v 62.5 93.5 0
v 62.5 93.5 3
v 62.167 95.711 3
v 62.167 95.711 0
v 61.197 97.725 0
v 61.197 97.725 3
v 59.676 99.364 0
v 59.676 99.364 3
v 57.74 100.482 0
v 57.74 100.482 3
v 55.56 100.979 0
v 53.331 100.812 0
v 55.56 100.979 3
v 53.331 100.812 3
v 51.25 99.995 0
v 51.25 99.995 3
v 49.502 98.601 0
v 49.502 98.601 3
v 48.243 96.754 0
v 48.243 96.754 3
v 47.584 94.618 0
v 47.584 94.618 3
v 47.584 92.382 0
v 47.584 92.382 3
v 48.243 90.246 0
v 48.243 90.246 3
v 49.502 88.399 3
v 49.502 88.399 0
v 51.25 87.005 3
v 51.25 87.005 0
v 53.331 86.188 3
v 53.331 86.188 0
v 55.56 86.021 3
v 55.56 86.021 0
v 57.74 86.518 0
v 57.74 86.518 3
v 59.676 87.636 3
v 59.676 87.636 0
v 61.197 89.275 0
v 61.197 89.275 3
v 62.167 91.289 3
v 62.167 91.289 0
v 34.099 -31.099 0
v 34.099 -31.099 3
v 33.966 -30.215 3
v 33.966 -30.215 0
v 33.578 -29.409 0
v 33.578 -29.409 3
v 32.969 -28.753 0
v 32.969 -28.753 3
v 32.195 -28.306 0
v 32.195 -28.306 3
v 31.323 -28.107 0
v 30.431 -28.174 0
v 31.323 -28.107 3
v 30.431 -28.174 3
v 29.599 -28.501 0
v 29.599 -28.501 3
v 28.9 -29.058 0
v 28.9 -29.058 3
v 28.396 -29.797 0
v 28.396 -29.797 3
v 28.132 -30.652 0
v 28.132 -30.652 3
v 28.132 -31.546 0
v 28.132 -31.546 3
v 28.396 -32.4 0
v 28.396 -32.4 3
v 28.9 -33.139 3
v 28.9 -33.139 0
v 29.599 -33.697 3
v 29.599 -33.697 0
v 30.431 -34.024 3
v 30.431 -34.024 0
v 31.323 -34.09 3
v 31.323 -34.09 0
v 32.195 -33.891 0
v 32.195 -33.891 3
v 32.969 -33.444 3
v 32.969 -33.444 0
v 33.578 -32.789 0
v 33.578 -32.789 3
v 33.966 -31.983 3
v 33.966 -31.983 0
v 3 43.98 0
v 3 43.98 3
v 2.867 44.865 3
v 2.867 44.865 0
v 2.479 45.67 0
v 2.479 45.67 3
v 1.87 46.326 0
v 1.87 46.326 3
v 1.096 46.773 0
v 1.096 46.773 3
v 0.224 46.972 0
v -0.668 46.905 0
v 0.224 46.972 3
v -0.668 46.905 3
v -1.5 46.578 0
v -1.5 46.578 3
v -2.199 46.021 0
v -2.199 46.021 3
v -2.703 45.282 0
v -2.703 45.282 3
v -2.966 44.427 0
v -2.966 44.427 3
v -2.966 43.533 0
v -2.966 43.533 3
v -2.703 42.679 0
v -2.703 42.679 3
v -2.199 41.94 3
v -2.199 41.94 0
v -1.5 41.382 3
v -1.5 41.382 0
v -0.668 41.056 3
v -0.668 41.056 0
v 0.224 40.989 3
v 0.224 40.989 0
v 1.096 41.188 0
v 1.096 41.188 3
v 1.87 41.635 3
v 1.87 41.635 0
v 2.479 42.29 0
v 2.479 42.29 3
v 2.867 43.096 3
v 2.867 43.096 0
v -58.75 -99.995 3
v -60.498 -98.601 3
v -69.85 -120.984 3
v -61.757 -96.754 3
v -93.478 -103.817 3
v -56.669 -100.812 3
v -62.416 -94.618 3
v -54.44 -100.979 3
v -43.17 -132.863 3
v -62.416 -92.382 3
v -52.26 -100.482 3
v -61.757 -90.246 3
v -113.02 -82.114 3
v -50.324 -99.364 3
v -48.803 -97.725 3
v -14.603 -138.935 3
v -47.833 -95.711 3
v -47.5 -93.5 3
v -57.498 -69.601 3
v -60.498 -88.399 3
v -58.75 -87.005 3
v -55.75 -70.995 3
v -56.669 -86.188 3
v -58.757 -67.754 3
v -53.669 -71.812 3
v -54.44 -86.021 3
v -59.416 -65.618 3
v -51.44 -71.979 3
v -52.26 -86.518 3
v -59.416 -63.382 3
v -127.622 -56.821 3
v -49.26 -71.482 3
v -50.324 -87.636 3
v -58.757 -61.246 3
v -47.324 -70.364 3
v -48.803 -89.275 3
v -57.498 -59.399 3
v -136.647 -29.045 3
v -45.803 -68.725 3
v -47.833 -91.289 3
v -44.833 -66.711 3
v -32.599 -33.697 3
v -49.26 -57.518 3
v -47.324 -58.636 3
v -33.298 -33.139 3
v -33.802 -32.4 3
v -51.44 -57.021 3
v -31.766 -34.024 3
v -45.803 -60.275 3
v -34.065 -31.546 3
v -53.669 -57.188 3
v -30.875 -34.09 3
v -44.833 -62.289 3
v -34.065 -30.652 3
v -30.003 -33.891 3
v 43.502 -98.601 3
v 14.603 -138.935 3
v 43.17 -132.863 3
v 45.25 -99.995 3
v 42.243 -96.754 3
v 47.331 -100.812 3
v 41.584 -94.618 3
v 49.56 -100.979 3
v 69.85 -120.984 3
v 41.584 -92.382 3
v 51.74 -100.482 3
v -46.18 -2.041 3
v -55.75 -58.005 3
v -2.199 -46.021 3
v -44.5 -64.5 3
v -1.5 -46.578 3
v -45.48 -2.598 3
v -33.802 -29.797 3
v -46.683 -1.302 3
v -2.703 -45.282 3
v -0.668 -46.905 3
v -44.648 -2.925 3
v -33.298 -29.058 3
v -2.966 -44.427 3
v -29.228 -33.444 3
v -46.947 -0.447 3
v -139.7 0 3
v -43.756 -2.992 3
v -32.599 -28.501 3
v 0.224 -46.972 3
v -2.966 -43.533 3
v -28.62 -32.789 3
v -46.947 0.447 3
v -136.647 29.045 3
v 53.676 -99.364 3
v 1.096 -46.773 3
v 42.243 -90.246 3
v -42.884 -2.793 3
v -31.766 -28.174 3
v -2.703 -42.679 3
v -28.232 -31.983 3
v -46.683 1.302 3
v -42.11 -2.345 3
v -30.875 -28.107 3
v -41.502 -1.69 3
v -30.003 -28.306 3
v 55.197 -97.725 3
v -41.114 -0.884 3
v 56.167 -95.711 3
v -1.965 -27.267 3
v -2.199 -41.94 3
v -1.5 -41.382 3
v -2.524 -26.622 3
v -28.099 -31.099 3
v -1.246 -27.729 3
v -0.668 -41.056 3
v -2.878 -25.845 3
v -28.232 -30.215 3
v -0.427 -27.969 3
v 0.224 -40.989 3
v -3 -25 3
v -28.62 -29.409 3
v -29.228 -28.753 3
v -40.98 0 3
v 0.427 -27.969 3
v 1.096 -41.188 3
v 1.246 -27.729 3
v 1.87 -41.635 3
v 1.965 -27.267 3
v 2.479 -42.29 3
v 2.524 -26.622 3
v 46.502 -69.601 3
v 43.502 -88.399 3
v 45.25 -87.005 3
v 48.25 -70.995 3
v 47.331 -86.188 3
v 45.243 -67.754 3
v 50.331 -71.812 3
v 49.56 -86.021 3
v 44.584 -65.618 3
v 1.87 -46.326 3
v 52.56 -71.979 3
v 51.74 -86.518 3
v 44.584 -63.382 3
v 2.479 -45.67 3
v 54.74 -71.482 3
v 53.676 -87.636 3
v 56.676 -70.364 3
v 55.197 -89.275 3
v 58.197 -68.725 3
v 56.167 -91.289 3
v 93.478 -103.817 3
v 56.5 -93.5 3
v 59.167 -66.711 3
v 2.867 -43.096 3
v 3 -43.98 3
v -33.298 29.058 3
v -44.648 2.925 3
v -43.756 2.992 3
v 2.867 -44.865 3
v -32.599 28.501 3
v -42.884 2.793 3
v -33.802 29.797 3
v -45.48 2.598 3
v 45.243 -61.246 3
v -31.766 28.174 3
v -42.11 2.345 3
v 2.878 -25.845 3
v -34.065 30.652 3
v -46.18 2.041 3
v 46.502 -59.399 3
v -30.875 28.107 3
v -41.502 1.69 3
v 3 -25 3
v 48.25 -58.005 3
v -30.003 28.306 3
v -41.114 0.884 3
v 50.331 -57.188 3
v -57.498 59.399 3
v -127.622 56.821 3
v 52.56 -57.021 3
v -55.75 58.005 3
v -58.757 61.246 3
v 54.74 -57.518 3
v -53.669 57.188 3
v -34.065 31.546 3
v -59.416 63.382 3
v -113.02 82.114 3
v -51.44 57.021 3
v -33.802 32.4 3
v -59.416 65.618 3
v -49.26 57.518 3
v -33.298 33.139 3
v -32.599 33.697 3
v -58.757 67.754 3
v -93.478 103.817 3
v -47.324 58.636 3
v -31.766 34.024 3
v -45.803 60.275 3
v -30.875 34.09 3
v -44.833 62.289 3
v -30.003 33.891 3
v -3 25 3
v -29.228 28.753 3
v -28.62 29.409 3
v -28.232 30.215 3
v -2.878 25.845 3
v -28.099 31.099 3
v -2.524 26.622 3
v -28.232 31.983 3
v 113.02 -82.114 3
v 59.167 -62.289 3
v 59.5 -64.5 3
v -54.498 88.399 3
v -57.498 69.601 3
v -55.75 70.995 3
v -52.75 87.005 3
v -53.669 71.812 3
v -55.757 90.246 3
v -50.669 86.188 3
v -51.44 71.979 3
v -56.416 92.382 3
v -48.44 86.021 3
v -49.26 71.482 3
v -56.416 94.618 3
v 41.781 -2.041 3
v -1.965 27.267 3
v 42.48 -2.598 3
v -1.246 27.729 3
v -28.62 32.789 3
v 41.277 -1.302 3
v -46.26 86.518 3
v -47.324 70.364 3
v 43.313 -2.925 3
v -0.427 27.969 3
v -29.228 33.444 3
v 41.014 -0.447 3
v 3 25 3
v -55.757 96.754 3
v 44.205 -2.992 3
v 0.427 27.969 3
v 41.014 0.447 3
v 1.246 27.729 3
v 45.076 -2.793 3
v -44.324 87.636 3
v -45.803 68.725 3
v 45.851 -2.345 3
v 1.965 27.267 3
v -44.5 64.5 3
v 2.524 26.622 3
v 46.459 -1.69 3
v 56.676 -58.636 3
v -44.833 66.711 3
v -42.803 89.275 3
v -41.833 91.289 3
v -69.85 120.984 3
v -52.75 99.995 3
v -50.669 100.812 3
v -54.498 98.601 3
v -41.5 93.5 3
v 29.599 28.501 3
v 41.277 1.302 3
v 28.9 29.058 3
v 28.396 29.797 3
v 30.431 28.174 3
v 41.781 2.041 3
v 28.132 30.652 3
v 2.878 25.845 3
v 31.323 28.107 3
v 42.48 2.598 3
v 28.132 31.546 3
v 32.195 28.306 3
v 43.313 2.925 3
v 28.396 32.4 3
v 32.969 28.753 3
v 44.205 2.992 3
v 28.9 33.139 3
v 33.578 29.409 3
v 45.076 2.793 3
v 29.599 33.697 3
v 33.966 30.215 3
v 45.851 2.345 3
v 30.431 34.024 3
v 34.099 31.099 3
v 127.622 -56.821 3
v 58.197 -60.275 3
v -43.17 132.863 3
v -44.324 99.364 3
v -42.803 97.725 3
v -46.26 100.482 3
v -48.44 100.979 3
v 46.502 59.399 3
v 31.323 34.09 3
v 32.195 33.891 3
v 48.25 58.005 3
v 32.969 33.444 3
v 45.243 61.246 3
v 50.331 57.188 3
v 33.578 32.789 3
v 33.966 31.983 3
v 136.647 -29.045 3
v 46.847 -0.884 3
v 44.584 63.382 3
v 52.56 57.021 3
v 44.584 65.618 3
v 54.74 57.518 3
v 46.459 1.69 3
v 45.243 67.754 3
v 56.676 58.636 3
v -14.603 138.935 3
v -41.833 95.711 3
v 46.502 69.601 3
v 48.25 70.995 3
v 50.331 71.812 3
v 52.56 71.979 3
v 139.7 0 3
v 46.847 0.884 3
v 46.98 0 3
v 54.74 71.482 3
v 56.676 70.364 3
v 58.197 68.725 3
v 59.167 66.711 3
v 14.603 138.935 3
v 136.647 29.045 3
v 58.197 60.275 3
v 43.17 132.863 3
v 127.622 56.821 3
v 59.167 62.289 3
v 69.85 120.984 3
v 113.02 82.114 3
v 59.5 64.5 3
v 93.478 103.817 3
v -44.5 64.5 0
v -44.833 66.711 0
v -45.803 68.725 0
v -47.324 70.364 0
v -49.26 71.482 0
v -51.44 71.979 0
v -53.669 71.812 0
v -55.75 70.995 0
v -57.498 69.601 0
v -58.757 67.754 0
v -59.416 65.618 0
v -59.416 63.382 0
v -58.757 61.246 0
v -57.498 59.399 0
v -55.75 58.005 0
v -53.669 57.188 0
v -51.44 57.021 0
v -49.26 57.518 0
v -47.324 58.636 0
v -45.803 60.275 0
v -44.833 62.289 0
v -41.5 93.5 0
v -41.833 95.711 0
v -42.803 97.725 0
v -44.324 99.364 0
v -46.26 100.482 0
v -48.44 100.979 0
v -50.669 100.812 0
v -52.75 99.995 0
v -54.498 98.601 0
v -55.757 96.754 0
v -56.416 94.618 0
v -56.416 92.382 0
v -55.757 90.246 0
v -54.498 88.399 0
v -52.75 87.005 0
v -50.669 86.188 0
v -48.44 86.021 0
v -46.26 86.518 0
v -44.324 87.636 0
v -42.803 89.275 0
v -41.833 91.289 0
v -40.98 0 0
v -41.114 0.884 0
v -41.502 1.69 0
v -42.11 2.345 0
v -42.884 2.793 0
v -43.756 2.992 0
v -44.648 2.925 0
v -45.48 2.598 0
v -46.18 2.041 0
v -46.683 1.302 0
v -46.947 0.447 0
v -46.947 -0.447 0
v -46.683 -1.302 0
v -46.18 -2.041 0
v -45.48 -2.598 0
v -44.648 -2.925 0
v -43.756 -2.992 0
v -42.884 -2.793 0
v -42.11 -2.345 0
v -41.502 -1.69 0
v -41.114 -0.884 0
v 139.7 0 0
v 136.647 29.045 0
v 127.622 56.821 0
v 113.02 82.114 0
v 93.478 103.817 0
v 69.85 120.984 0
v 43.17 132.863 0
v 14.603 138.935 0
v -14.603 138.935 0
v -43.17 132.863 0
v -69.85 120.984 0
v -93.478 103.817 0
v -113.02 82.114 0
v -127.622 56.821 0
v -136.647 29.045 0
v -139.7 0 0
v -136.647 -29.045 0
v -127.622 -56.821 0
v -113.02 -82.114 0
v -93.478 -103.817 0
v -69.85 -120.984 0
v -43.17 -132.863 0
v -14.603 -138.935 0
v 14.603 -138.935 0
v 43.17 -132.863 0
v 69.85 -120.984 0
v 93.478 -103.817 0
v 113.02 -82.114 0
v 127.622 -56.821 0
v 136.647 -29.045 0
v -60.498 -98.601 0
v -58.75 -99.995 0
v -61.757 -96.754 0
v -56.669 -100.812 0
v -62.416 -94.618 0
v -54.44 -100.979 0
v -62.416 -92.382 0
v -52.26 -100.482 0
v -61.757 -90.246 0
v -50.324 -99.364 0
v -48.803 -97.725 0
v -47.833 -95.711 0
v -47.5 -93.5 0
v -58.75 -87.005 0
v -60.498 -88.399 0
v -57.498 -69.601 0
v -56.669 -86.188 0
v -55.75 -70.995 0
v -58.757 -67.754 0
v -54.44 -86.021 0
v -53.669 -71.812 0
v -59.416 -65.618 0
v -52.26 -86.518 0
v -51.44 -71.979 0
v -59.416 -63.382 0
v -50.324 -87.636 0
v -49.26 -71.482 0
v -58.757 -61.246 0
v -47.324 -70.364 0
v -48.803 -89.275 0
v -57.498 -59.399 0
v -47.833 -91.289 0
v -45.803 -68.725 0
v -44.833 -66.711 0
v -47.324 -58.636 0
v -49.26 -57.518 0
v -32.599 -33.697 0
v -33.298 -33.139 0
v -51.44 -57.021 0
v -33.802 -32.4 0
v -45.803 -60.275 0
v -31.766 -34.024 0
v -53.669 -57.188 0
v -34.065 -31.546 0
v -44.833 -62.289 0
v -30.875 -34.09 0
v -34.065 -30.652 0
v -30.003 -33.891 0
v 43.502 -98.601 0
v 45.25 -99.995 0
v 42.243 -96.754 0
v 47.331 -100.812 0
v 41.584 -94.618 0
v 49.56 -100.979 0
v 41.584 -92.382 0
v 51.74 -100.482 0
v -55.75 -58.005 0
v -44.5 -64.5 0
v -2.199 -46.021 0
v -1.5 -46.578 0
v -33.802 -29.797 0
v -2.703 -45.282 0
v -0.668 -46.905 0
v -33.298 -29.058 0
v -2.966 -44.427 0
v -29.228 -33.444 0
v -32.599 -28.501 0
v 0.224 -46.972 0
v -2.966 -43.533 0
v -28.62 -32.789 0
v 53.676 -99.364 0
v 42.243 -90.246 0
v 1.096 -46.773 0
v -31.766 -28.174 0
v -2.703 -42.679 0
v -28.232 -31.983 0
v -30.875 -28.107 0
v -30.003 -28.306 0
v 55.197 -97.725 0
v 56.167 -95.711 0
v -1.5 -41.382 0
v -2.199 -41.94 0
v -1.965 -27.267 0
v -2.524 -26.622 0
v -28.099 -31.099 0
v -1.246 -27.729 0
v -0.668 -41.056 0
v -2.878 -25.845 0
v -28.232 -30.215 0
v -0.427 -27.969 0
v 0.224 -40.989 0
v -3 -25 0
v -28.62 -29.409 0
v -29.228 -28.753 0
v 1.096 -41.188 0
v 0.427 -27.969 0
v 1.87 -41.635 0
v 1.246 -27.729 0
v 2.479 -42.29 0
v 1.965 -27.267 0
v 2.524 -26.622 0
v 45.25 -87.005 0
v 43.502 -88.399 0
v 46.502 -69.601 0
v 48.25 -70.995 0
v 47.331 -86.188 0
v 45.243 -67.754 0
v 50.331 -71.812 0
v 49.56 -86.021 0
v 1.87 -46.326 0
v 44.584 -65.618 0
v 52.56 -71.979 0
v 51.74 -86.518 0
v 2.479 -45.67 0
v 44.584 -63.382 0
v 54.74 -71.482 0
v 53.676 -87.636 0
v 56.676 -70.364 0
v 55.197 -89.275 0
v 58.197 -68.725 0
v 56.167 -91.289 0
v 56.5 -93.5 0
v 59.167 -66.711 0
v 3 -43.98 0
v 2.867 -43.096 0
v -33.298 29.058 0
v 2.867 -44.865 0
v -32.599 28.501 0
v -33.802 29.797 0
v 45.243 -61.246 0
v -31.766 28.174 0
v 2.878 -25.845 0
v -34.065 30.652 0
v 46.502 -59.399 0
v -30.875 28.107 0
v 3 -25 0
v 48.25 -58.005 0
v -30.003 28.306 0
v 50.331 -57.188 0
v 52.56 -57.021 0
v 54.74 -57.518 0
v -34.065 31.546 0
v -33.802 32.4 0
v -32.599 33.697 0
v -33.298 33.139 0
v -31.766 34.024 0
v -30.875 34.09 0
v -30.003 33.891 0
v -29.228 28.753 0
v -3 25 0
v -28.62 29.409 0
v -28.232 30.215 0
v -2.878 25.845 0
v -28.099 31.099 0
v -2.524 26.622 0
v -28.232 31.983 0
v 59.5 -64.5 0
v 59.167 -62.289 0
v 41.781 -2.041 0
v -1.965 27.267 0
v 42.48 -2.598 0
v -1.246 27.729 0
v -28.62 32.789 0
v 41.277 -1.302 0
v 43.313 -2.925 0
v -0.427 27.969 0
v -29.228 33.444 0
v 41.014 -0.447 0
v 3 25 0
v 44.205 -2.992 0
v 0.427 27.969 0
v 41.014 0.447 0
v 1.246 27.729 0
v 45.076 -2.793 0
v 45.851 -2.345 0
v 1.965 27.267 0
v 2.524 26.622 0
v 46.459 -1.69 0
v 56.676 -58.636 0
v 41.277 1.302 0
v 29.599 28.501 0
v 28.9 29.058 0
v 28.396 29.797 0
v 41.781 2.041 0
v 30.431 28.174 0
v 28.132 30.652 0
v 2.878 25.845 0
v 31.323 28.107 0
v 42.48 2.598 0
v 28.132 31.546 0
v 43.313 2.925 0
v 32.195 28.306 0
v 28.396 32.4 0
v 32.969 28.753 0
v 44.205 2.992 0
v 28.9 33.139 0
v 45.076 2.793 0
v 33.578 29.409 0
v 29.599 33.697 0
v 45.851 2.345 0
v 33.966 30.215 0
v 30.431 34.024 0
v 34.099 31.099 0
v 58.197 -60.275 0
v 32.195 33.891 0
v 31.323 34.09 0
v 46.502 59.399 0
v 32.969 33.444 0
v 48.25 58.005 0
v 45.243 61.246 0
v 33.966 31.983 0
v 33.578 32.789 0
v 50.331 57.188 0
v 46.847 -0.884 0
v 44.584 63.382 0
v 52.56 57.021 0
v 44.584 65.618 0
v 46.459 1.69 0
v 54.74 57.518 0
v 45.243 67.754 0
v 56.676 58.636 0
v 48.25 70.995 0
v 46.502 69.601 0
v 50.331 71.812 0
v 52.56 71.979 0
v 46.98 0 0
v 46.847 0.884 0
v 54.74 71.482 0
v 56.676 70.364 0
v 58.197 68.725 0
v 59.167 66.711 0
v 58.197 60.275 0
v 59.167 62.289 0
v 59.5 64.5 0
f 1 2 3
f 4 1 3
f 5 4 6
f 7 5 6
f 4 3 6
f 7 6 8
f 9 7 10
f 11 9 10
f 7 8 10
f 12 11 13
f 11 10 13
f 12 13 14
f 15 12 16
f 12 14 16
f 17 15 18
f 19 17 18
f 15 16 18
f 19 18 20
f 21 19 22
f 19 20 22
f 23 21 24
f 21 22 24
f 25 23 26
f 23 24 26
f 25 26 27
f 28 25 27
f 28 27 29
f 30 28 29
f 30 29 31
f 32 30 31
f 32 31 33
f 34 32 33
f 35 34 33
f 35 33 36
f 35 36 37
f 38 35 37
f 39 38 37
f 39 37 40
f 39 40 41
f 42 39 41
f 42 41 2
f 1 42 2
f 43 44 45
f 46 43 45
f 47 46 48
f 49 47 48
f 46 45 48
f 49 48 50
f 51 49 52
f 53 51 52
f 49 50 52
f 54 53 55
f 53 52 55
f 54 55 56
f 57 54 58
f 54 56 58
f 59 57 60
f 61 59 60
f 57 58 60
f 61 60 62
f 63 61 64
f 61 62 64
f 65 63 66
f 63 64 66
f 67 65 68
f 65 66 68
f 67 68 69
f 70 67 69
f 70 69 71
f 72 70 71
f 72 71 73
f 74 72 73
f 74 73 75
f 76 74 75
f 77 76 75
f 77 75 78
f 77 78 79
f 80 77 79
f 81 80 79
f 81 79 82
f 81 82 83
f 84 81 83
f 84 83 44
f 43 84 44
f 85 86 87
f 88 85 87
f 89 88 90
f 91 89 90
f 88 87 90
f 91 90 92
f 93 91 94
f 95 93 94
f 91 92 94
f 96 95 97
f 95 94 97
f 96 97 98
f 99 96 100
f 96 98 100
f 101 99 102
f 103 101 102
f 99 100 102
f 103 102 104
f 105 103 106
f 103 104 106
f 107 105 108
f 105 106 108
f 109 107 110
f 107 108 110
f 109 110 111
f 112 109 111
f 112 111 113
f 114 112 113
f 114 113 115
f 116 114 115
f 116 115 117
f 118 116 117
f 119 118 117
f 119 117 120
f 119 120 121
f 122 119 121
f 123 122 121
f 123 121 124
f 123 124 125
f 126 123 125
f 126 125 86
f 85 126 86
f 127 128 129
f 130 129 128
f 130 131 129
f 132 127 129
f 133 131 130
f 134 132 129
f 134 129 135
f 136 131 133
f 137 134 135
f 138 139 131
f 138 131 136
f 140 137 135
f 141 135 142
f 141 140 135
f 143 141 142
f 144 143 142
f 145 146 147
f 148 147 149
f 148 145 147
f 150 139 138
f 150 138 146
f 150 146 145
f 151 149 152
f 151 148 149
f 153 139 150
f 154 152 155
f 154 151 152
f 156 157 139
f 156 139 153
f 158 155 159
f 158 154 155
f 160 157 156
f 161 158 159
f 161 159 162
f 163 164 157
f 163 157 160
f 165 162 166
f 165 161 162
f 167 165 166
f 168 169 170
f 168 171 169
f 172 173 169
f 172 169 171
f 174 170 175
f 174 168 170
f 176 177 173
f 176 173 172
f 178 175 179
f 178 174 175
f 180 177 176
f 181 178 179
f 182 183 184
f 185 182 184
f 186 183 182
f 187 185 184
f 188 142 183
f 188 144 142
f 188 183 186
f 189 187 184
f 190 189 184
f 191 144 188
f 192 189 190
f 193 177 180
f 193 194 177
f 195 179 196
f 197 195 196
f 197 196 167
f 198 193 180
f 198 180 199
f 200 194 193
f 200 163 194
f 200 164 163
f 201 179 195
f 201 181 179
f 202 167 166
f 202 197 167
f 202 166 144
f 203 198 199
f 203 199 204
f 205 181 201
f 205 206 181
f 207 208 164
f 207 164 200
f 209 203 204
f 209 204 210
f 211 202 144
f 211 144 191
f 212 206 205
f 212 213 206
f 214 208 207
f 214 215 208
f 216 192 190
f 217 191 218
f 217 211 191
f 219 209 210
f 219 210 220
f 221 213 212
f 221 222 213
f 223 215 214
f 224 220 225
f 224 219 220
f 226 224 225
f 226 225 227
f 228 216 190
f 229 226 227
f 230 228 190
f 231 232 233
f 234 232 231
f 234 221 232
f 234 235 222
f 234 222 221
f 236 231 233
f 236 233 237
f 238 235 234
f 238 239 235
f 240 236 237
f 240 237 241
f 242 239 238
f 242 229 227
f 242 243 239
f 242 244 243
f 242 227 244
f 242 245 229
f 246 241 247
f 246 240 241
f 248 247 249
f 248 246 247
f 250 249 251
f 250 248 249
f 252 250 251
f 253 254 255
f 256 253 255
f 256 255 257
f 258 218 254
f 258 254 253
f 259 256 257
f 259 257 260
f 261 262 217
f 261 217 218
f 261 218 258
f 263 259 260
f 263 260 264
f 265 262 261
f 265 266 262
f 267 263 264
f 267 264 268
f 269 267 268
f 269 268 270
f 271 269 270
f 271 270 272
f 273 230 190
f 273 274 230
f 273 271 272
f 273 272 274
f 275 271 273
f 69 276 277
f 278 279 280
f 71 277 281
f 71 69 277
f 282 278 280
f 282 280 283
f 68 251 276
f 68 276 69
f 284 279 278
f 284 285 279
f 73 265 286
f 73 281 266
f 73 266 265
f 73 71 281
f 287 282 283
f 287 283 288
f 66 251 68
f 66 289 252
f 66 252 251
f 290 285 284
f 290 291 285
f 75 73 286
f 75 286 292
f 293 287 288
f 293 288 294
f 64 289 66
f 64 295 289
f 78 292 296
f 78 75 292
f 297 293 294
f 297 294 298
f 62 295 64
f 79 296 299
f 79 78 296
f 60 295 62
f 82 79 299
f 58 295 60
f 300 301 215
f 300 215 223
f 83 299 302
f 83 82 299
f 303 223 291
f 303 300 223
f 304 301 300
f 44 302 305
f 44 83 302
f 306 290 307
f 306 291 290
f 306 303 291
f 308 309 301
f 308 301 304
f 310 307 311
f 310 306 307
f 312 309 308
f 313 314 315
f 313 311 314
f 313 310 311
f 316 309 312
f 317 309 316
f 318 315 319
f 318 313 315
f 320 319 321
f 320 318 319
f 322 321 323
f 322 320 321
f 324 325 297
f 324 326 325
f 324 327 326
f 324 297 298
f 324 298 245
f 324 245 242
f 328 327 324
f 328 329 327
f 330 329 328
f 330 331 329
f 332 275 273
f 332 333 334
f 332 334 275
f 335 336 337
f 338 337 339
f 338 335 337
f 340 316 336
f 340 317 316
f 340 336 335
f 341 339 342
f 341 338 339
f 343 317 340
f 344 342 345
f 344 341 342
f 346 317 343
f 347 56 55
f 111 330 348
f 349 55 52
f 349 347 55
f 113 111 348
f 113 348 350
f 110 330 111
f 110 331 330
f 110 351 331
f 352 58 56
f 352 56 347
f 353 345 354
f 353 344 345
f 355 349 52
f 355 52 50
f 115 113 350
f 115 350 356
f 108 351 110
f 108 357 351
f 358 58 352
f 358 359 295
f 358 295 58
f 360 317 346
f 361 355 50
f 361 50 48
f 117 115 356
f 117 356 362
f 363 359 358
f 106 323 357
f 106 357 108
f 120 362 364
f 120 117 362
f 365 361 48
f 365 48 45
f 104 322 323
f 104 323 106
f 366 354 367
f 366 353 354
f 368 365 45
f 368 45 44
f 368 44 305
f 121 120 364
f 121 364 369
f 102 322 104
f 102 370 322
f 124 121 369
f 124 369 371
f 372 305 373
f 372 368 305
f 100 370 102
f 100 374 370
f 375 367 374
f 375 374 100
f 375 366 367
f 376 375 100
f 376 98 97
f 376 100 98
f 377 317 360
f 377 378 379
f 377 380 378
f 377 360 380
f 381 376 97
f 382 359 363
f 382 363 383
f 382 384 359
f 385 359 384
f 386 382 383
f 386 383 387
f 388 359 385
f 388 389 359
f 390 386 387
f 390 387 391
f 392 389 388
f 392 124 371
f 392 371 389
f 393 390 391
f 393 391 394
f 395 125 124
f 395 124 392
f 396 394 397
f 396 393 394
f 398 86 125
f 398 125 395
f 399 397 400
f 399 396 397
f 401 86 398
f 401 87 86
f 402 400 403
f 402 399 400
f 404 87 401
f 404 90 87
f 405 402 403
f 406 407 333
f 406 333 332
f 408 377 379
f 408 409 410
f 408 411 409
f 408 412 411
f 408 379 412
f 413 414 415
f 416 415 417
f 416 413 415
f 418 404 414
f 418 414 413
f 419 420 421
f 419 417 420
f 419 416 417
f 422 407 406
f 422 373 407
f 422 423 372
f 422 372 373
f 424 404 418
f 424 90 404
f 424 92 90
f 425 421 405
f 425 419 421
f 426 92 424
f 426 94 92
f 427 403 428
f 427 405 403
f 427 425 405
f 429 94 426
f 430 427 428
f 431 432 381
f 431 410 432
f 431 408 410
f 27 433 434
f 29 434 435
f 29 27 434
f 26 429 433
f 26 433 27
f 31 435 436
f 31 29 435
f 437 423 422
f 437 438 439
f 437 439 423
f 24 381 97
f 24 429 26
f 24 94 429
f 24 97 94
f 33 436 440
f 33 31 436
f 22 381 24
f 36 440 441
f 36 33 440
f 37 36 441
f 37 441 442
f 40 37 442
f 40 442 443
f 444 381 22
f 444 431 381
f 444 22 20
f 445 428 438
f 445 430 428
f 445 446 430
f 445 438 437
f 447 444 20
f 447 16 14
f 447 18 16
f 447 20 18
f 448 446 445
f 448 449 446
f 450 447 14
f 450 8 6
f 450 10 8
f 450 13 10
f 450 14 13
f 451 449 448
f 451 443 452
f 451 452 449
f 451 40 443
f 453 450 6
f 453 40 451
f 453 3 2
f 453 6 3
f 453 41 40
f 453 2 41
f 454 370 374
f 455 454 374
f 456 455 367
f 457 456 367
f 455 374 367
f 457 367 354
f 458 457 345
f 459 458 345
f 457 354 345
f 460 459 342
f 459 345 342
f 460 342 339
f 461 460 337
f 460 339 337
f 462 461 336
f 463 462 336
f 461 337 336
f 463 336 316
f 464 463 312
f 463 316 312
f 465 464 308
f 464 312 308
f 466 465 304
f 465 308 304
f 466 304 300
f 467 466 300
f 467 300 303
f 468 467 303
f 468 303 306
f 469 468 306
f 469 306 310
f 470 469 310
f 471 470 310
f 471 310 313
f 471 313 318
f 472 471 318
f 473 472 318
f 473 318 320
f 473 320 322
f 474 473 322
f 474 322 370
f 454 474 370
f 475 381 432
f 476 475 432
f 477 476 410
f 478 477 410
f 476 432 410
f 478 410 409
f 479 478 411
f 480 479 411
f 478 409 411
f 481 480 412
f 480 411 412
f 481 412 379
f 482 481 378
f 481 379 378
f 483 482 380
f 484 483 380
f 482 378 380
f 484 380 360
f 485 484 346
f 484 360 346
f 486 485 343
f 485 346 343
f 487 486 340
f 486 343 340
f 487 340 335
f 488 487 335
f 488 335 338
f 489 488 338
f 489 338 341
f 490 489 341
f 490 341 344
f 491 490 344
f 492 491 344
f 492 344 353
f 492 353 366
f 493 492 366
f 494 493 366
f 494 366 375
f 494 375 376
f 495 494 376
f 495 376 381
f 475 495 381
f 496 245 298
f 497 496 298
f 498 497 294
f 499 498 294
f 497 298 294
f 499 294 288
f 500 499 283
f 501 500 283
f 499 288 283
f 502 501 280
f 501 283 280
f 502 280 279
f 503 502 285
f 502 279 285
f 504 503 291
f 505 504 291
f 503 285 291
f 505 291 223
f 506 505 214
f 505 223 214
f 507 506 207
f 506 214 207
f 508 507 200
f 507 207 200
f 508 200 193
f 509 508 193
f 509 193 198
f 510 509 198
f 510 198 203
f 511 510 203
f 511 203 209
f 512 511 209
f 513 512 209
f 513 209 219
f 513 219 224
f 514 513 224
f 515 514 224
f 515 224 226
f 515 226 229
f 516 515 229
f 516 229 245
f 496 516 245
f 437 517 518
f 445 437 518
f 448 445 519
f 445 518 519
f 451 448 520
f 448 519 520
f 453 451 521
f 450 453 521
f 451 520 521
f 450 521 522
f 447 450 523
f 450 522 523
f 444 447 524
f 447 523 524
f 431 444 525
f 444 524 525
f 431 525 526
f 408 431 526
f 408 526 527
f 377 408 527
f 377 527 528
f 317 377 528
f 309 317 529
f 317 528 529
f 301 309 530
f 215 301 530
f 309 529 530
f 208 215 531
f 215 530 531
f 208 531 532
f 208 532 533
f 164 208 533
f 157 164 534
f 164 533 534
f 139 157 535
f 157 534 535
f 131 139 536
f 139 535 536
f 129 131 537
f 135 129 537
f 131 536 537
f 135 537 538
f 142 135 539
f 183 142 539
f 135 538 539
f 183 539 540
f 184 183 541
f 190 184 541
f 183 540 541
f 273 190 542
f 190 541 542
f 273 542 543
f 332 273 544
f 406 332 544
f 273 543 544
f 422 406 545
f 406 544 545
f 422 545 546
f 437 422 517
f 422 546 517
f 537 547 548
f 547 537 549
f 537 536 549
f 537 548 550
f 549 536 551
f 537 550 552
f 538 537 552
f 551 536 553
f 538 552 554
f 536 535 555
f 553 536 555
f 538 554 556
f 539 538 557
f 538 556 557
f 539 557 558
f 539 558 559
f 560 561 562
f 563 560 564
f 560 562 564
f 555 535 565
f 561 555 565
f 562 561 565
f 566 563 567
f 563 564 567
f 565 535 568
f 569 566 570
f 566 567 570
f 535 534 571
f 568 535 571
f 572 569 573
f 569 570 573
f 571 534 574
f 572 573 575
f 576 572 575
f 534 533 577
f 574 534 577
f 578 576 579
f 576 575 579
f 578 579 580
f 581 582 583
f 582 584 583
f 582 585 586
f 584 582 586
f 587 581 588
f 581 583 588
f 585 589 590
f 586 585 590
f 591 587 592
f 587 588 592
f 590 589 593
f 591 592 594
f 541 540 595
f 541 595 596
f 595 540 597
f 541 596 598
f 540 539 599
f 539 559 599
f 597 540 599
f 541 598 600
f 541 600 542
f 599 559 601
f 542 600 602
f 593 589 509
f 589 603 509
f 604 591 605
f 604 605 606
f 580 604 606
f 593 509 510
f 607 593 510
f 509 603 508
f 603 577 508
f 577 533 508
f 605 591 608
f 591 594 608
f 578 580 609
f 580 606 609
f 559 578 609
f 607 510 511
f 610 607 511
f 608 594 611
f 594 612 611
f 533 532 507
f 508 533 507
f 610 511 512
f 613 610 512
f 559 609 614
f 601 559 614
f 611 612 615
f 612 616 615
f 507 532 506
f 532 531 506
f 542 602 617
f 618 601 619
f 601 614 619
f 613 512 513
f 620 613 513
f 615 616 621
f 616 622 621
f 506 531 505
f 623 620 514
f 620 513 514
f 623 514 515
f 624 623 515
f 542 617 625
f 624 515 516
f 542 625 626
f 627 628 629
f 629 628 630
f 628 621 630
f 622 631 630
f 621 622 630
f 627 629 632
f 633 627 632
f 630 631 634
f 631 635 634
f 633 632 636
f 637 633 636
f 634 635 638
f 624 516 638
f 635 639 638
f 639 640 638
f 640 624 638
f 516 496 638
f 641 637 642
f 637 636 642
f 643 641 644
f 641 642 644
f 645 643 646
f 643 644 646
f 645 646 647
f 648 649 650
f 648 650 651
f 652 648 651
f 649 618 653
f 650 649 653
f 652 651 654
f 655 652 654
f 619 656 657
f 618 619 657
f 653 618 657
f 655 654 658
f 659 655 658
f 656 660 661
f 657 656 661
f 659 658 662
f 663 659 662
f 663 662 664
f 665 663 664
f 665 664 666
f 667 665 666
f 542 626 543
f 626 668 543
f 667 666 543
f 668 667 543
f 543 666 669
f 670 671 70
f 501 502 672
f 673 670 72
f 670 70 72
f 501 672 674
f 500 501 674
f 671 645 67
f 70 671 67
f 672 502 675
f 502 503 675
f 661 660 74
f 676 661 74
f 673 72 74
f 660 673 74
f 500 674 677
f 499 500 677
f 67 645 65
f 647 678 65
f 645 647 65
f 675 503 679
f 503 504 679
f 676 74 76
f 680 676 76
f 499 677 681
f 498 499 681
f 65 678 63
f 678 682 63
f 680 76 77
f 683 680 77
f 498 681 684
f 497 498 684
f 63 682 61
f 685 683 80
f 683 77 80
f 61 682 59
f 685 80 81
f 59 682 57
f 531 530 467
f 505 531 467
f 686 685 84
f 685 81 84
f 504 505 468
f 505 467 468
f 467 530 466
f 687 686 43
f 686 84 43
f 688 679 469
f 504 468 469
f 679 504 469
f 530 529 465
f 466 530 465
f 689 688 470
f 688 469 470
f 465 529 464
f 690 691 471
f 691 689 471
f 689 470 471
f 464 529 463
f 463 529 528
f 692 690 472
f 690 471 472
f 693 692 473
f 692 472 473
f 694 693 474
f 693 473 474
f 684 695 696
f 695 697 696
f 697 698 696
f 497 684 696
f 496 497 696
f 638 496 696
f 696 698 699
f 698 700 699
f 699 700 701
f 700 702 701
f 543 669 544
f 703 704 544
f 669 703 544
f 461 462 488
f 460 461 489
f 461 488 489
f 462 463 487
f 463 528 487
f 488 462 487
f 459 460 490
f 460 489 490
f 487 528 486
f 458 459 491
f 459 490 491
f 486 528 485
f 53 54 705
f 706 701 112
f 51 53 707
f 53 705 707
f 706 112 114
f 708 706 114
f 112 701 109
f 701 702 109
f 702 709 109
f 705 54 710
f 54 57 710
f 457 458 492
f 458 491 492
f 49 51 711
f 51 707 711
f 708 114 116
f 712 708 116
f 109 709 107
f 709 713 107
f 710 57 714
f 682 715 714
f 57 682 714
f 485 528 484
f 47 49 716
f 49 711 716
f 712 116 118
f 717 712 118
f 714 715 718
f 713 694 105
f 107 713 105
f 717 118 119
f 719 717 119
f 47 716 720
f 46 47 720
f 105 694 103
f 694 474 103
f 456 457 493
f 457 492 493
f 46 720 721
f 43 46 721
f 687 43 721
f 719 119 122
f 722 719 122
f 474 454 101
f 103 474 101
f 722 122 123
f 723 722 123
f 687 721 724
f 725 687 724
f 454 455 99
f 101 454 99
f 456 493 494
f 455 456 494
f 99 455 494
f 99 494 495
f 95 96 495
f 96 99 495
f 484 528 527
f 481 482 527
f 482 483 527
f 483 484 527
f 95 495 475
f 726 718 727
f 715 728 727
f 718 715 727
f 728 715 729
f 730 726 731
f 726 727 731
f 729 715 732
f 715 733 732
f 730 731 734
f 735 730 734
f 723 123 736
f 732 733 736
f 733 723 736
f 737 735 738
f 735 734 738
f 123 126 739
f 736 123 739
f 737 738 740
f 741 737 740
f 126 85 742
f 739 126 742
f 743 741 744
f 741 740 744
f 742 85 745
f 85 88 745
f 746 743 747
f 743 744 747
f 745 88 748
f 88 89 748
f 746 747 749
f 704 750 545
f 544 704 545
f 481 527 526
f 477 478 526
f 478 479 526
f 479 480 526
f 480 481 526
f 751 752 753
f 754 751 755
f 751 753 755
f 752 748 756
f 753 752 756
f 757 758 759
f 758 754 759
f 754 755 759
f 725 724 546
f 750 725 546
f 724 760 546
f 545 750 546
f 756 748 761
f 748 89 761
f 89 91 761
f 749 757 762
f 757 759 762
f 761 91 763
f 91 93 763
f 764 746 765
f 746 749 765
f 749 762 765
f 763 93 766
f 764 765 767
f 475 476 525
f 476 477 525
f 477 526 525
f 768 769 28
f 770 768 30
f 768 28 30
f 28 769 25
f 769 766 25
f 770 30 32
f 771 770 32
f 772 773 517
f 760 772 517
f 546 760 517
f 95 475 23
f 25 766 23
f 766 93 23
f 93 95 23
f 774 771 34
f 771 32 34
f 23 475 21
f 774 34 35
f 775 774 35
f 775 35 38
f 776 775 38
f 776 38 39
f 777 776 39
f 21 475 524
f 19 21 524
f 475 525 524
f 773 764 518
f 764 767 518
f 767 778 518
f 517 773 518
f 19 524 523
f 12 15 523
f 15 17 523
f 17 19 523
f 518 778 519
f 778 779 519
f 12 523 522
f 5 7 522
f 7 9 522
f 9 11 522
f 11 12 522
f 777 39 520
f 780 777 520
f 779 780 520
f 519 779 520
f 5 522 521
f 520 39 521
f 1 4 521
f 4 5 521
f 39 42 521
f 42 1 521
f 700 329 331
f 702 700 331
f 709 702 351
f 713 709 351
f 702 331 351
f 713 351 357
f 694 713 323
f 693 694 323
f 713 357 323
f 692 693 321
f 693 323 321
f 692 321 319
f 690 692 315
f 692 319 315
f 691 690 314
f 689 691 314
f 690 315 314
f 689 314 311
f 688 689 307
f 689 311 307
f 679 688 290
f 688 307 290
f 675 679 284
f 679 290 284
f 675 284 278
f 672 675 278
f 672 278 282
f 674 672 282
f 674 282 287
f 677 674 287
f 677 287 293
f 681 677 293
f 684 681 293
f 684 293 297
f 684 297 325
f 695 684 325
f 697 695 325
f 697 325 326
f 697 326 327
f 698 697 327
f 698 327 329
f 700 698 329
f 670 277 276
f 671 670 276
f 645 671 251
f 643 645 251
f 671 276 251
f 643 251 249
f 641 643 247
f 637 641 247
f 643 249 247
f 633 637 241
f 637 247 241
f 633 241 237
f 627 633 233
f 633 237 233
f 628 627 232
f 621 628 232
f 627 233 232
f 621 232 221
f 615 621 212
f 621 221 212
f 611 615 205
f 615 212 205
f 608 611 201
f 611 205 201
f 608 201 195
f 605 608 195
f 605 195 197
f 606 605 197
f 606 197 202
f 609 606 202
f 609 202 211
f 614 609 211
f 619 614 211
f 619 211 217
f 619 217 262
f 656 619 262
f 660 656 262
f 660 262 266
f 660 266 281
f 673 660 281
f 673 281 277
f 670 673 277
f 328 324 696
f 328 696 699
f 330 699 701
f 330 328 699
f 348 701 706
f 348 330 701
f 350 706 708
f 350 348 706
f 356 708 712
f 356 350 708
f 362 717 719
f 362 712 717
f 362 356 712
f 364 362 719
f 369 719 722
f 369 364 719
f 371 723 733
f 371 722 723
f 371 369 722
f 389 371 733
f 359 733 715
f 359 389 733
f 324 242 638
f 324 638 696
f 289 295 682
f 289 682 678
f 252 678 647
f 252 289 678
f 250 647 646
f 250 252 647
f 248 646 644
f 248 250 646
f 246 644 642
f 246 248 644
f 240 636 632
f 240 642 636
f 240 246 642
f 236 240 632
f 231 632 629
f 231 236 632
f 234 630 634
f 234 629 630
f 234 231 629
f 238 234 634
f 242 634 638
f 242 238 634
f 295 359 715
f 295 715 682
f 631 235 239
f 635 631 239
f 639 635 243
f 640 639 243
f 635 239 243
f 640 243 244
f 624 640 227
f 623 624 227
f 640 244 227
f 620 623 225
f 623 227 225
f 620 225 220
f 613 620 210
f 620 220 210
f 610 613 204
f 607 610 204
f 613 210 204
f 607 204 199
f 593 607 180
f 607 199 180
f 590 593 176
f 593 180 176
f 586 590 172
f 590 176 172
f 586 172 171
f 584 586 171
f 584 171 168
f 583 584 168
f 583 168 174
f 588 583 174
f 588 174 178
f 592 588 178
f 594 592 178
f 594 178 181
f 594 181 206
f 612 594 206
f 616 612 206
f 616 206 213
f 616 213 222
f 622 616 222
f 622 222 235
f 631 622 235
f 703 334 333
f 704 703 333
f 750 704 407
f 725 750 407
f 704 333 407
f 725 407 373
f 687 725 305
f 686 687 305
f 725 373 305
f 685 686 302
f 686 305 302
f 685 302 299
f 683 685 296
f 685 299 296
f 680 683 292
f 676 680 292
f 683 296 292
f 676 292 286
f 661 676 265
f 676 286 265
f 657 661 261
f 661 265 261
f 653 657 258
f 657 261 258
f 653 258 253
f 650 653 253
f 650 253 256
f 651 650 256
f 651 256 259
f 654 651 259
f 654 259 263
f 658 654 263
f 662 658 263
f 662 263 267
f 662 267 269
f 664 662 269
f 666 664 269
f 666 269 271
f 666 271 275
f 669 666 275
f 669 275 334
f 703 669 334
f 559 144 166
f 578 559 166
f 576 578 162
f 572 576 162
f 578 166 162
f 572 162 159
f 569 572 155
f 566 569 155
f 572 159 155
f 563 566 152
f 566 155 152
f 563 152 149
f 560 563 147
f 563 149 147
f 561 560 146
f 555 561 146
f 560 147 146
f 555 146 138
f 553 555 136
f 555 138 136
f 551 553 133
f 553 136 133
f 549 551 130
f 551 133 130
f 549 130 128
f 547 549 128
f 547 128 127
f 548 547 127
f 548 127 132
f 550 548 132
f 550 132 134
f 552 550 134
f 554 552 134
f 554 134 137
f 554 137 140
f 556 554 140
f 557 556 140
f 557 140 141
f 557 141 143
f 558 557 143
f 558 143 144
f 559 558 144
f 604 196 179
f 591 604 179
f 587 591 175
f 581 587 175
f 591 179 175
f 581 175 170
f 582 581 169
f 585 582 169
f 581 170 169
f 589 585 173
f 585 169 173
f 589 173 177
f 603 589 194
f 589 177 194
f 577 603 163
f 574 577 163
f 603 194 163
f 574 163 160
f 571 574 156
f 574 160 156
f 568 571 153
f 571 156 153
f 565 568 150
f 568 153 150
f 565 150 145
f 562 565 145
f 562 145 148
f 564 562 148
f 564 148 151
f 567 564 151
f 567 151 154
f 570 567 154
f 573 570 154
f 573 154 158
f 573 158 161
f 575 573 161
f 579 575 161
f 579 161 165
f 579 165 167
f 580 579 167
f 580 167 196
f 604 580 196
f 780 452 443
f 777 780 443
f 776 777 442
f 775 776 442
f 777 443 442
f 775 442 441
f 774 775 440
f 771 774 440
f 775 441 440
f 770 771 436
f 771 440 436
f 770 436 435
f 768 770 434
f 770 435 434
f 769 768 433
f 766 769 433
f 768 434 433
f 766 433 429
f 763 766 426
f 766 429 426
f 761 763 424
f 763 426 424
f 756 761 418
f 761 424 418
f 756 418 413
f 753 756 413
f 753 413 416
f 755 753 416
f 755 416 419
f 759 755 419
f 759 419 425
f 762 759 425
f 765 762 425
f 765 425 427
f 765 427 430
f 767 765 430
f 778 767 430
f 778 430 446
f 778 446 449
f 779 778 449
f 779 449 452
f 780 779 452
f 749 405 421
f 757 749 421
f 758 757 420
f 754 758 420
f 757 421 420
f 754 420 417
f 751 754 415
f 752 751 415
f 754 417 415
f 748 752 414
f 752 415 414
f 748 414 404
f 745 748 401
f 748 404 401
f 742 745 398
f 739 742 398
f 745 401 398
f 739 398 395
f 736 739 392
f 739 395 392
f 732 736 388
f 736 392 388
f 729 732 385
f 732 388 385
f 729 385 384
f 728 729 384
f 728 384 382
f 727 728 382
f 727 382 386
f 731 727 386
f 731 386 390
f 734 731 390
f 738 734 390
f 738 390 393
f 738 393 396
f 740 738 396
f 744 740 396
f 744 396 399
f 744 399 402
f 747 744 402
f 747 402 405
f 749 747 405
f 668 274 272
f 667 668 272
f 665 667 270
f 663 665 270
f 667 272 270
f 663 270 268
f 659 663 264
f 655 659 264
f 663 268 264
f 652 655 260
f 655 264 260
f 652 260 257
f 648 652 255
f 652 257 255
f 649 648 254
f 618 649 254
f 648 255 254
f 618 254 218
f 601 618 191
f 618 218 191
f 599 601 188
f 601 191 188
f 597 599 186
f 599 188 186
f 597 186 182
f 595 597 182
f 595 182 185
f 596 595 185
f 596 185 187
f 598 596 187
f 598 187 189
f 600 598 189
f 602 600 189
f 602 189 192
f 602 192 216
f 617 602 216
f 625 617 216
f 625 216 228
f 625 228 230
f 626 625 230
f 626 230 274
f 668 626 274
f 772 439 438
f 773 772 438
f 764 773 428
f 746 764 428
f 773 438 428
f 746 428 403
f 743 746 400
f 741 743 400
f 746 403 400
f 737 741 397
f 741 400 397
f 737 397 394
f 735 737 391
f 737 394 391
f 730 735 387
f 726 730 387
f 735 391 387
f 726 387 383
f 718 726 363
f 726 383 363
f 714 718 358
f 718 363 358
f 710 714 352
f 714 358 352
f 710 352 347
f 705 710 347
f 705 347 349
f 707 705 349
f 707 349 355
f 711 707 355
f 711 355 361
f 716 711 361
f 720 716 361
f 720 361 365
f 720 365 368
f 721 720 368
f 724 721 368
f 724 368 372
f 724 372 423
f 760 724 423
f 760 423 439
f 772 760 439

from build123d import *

# Parameters (mm, degrees)
SKETCH1_R           = 139.7
BOSS_EXTRUDE1_DEPTH = 3
SKETCH2_R           = 3
CUT_EXTRUDE1_DEPTH  = 4
SKETCH3_R           = 7.5
CUT_EXTRUDE2_DEPTH  = 4


with BuildPart() as part:
    # Sketch1 → Boss-Extrude1 (new body)
    with BuildSketch(Plane.XY):
        Circle(SKETCH1_R)
    extrude(amount=BOSS_EXTRUDE1_DEPTH)

    # Sketch2 → Cut-Extrude1 (cut, through all)
    with BuildSketch(Plane.XY.offset(3)):
        with Locations((0, 43.980361528)):
            Circle(SKETCH2_R)
        with Locations((31.098811876, 31.098811876)):
            Circle(SKETCH2_R)
        with Locations((43.980361528, 0)):
            Circle(SKETCH2_R)
        with Locations((31.098811876, -31.098811876)):
            Circle(SKETCH2_R)
        with Locations((0, -43.980361528)):
            Circle(SKETCH2_R)
        with Locations((-31.098811876, -31.098811876)):
            Circle(SKETCH2_R)
        with Locations((-43.980361528, 0)):
            Circle(SKETCH2_R)
        with Locations((-31.098811876, 31.098811876)):
            Circle(SKETCH2_R)
        with BuildLine():
            Line((-3, -25), (-3, 25))
            ThreePointArc((-3, 25), (0, 28), (3, 25))
            Line((3, 25), (3, -25))
            ThreePointArc((3, -25), (0, -28), (-3, -25))
        make_face()
    extrude(amount=-CUT_EXTRUDE1_DEPTH, mode=Mode.SUBTRACT)

    # Sketch3 → Cut-Extrude2 (cut, through all)
    with BuildSketch(Plane.XY.offset(3)):
        with Locations((-52, -64.5)):
            Circle(SKETCH3_R)
        with Locations((-55, -93.5)):
            Circle(SKETCH3_R)
        with Locations((52, 64.5)):
            Circle(SKETCH3_R)
        with Locations((55, 93.5)):
            Circle(SKETCH3_R)
        with Locations((52, -64.5)):
            Circle(SKETCH3_R)
        with Locations((49, -93.5)):
            Circle(SKETCH3_R)
        with Locations((-52, 64.5)):
            Circle(SKETCH3_R)
        with Locations((-49, 93.5)):
            Circle(SKETCH3_R)
    extrude(amount=-CUT_EXTRUDE2_DEPTH, mode=Mode.SUBTRACT)


solid = part.part
